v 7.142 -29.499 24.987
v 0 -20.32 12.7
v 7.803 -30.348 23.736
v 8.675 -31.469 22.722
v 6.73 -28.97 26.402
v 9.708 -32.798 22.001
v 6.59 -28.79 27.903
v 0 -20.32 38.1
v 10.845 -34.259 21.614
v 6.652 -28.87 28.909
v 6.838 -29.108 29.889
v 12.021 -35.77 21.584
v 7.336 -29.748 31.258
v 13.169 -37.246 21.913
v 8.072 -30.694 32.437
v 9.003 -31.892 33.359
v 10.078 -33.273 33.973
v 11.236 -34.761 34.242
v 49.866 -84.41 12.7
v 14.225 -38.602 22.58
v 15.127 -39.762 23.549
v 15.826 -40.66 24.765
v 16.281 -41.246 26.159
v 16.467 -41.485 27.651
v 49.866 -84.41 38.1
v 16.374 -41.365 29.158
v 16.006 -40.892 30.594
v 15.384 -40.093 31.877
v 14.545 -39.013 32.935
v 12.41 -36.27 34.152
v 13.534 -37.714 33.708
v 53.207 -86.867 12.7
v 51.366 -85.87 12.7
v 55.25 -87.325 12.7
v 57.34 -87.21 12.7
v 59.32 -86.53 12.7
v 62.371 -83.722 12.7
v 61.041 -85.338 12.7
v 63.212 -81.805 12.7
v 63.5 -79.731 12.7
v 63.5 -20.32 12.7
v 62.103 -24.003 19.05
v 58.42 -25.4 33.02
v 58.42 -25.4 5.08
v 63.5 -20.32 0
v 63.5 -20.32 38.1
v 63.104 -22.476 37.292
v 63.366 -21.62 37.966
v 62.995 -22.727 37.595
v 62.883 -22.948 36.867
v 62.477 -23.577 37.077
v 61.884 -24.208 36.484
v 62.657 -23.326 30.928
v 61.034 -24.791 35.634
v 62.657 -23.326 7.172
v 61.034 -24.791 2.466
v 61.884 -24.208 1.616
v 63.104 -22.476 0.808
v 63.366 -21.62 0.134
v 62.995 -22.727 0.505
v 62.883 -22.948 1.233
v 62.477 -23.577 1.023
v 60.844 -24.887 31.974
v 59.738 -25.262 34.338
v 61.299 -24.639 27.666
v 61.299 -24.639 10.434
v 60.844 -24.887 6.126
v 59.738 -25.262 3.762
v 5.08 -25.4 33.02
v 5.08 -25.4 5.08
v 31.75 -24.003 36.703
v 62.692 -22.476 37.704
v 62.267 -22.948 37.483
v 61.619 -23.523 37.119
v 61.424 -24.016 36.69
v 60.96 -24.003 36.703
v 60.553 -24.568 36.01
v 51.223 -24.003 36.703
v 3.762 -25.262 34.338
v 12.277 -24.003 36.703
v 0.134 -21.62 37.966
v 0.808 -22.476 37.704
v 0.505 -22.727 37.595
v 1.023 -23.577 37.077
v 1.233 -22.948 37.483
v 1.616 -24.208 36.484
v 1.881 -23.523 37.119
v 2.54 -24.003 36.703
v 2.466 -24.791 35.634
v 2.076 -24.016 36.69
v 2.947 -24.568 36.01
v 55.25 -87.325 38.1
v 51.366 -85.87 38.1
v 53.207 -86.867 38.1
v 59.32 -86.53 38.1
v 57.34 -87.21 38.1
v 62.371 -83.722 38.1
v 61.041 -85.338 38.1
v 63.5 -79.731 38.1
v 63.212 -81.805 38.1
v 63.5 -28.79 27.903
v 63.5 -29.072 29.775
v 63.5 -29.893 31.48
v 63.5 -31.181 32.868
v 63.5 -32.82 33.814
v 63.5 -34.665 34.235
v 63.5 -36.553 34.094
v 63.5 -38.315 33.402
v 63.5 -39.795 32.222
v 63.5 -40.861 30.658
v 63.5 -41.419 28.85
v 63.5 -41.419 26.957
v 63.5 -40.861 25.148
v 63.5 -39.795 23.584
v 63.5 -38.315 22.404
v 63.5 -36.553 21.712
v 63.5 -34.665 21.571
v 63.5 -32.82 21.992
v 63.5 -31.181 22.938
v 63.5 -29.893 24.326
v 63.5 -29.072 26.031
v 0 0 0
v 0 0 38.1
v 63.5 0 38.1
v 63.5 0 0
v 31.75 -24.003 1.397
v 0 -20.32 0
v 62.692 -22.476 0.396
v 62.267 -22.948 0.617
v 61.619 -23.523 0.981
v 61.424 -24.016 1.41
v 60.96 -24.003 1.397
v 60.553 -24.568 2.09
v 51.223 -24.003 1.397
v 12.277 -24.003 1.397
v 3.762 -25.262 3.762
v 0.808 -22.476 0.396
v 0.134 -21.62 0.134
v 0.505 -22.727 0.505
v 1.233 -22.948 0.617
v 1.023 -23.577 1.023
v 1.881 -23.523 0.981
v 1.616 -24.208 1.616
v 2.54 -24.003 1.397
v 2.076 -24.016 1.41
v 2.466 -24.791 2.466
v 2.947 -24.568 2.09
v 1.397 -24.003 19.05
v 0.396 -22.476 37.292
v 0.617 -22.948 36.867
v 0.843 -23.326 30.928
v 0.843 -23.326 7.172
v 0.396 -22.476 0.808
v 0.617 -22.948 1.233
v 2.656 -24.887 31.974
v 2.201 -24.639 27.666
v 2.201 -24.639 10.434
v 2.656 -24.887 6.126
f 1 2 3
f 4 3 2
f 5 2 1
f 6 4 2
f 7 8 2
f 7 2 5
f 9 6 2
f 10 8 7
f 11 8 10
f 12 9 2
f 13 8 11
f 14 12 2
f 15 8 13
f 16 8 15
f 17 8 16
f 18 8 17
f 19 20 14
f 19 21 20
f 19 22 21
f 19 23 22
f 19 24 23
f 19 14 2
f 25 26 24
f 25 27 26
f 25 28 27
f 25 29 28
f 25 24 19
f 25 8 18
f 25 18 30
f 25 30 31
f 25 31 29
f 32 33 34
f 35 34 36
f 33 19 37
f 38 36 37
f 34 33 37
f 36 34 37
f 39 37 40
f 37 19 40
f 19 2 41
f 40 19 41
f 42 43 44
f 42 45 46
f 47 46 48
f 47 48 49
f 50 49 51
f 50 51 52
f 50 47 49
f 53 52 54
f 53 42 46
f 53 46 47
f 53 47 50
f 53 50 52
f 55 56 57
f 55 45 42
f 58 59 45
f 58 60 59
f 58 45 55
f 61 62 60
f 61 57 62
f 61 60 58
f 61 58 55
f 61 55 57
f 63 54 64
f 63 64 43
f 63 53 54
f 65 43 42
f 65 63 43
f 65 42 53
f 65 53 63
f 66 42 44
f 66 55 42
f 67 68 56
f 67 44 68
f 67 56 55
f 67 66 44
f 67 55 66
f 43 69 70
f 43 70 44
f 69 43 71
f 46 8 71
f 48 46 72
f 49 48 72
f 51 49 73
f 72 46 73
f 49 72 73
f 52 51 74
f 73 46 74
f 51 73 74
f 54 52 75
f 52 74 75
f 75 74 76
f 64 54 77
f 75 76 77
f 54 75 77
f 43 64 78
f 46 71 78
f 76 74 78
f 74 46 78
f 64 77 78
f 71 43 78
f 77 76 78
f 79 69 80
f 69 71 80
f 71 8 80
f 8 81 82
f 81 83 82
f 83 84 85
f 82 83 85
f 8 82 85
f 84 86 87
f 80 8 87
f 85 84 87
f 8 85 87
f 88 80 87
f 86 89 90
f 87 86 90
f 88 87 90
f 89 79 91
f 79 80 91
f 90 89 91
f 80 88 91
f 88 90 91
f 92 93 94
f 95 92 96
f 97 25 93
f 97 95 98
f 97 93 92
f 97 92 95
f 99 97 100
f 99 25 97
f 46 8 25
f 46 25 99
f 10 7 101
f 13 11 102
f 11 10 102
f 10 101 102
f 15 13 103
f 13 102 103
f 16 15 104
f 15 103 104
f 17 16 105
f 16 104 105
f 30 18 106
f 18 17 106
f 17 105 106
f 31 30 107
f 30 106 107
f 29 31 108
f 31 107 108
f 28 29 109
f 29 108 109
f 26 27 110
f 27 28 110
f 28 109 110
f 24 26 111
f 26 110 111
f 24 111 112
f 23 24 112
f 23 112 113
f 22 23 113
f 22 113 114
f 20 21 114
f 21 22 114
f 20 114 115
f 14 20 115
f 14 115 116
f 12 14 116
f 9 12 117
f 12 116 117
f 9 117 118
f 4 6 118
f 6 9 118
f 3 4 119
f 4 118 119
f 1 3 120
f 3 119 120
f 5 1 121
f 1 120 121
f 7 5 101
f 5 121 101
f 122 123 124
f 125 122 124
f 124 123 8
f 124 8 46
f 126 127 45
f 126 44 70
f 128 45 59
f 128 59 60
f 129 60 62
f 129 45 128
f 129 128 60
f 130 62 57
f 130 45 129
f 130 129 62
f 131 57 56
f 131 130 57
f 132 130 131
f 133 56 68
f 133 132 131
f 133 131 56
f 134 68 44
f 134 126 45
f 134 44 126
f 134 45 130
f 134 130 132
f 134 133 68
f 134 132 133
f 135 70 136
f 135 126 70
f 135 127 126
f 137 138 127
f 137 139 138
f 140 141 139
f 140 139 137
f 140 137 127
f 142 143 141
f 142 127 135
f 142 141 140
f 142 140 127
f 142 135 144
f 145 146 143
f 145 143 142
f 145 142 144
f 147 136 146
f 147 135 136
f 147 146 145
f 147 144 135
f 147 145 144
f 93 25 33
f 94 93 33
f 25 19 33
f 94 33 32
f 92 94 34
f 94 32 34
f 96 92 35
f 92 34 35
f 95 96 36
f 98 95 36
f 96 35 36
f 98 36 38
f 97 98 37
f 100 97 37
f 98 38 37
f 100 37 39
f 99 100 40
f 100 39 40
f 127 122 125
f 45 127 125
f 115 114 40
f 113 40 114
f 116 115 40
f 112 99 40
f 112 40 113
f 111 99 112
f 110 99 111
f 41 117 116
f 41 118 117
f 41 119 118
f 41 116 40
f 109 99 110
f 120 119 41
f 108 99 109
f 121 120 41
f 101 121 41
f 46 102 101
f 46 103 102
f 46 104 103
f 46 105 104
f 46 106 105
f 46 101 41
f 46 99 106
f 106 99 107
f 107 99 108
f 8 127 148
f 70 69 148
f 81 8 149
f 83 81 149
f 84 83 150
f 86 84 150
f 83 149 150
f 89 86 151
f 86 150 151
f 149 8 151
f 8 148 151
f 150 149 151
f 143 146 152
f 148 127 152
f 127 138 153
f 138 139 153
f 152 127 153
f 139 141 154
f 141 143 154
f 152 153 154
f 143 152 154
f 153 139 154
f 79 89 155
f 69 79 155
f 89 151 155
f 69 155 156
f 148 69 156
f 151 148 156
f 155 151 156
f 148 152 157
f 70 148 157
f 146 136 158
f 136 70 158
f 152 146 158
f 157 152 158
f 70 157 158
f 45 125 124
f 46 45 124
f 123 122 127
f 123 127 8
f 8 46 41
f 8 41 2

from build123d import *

# Parameters (mm, degrees)
F0_W        = 63.5
F0_H        = 38.1
F1_DEPTH    = 25.4
F2_T1_DEPTH = 63.5
F2_T3_DEPTH = 88.9
F4_DEPTH    = 25.399999693
F5_R        = 6.35
F6_DEPTH    = 56.9109635576
F7_R        = 7.62


# Not quite as in the source:
# - a fillet or chamfer that OpenCascade refuses, or shapes differently, is made with other operations: its cross-section is extruded or revolved along the edge and cut away or added


with BuildPart() as f1:
    # F0 (on Front) → F1 (new body)
    with BuildSketch(Plane.XZ):
        with Locations((31.75, 19.05)):
            Rectangle(F0_W, F0_H)
    extrude(amount=F1_DEPTH)

    # F2: fillet of radius 5.08 on 4 edges, made by hand

    # F2_s2 → F2_t1 (cut)
    with BuildSketch(Plane.XY.offset(-12.7)):
        with BuildLine():
            add(Edge.make_bspline(
                [(0, -20.32), (0, -25.4), (5.08, -25.4)],
                knots=[0, 0, 0, 1, 1, 1], degree=2, weights=[1, 0.8181818182, 1]))
            Line((5.08, -25.4), (0, -25.4))
            Line((0, -25.4), (0, -20.32))
        make_face()
        with BuildLine():
            add(Edge.make_bspline(
                [(63.5, -20.32), (63.5, -25.4), (58.42, -25.4)],
                knots=[0, 0, 0, 1, 1, 1], degree=2, weights=[1, 0.8181818182, 1]))
            Line((58.42, -25.4), (63.5, -25.4))
            Line((63.5, -25.4), (63.5, -20.32))
        make_face()
    extrude(amount=F2_T1_DEPTH, mode=Mode.SUBTRACT)

    # F2_s4 → F2_t3 (cut)
    with BuildSketch(Plane.YZ.offset(-12.7)):
        with BuildLine():
            add(Edge.make_bspline(
                [(-20.32, 0), (-25.4, 0), (-25.4, 5.08)],
                knots=[0, 0, 0, 1, 1, 1], degree=2, weights=[1, 0.8181818182, 1]))
            Line((-25.4, 5.08), (-25.4, 0))
            Line((-25.4, 0), (-20.32, 0))
        make_face()
        with BuildLine():
            add(Edge.make_bspline(
                [(-20.32, 38.1), (-25.4, 38.1), (-25.4, 33.02)],
                knots=[0, 0, 0, 1, 1, 1], degree=2, weights=[1, 0.8181818182, 1]))
            Line((-25.4, 33.02), (-25.4, 38.1))
            Line((-25.4, 38.1), (-20.32, 38.1))
        make_face()
    extrude(amount=F2_T3_DEPTH, mode=Mode.SUBTRACT)


with BuildPart() as f4:
    # F3 (on face) → F4 (new body)
    with BuildSketch(Plane.XY.offset(38.1)):
        Polygon((0, -20.32), (63.5, -101.9336432219), (63.5, -20.32), align=None)
    extrude(amount=-F4_DEPTH)

    # F5 (on face) → F6 (cut, through all)
    with BuildSketch(Plane.YZ.offset(63.5)):
        with Locations((-35.1398721737, 27.9031097638)):
            Circle(F5_R)
    extrude(amount=-F6_DEPTH, mode=Mode.SUBTRACT)

    # F7
    f7_edges = [f4.edges().sort_by_distance(p)[0] for p in [
        (63.5, -101.933643, 25.4),
    ]]
    fillet(f7_edges, radius=F7_R)


solid = Compound([f1.part, f4.part])
